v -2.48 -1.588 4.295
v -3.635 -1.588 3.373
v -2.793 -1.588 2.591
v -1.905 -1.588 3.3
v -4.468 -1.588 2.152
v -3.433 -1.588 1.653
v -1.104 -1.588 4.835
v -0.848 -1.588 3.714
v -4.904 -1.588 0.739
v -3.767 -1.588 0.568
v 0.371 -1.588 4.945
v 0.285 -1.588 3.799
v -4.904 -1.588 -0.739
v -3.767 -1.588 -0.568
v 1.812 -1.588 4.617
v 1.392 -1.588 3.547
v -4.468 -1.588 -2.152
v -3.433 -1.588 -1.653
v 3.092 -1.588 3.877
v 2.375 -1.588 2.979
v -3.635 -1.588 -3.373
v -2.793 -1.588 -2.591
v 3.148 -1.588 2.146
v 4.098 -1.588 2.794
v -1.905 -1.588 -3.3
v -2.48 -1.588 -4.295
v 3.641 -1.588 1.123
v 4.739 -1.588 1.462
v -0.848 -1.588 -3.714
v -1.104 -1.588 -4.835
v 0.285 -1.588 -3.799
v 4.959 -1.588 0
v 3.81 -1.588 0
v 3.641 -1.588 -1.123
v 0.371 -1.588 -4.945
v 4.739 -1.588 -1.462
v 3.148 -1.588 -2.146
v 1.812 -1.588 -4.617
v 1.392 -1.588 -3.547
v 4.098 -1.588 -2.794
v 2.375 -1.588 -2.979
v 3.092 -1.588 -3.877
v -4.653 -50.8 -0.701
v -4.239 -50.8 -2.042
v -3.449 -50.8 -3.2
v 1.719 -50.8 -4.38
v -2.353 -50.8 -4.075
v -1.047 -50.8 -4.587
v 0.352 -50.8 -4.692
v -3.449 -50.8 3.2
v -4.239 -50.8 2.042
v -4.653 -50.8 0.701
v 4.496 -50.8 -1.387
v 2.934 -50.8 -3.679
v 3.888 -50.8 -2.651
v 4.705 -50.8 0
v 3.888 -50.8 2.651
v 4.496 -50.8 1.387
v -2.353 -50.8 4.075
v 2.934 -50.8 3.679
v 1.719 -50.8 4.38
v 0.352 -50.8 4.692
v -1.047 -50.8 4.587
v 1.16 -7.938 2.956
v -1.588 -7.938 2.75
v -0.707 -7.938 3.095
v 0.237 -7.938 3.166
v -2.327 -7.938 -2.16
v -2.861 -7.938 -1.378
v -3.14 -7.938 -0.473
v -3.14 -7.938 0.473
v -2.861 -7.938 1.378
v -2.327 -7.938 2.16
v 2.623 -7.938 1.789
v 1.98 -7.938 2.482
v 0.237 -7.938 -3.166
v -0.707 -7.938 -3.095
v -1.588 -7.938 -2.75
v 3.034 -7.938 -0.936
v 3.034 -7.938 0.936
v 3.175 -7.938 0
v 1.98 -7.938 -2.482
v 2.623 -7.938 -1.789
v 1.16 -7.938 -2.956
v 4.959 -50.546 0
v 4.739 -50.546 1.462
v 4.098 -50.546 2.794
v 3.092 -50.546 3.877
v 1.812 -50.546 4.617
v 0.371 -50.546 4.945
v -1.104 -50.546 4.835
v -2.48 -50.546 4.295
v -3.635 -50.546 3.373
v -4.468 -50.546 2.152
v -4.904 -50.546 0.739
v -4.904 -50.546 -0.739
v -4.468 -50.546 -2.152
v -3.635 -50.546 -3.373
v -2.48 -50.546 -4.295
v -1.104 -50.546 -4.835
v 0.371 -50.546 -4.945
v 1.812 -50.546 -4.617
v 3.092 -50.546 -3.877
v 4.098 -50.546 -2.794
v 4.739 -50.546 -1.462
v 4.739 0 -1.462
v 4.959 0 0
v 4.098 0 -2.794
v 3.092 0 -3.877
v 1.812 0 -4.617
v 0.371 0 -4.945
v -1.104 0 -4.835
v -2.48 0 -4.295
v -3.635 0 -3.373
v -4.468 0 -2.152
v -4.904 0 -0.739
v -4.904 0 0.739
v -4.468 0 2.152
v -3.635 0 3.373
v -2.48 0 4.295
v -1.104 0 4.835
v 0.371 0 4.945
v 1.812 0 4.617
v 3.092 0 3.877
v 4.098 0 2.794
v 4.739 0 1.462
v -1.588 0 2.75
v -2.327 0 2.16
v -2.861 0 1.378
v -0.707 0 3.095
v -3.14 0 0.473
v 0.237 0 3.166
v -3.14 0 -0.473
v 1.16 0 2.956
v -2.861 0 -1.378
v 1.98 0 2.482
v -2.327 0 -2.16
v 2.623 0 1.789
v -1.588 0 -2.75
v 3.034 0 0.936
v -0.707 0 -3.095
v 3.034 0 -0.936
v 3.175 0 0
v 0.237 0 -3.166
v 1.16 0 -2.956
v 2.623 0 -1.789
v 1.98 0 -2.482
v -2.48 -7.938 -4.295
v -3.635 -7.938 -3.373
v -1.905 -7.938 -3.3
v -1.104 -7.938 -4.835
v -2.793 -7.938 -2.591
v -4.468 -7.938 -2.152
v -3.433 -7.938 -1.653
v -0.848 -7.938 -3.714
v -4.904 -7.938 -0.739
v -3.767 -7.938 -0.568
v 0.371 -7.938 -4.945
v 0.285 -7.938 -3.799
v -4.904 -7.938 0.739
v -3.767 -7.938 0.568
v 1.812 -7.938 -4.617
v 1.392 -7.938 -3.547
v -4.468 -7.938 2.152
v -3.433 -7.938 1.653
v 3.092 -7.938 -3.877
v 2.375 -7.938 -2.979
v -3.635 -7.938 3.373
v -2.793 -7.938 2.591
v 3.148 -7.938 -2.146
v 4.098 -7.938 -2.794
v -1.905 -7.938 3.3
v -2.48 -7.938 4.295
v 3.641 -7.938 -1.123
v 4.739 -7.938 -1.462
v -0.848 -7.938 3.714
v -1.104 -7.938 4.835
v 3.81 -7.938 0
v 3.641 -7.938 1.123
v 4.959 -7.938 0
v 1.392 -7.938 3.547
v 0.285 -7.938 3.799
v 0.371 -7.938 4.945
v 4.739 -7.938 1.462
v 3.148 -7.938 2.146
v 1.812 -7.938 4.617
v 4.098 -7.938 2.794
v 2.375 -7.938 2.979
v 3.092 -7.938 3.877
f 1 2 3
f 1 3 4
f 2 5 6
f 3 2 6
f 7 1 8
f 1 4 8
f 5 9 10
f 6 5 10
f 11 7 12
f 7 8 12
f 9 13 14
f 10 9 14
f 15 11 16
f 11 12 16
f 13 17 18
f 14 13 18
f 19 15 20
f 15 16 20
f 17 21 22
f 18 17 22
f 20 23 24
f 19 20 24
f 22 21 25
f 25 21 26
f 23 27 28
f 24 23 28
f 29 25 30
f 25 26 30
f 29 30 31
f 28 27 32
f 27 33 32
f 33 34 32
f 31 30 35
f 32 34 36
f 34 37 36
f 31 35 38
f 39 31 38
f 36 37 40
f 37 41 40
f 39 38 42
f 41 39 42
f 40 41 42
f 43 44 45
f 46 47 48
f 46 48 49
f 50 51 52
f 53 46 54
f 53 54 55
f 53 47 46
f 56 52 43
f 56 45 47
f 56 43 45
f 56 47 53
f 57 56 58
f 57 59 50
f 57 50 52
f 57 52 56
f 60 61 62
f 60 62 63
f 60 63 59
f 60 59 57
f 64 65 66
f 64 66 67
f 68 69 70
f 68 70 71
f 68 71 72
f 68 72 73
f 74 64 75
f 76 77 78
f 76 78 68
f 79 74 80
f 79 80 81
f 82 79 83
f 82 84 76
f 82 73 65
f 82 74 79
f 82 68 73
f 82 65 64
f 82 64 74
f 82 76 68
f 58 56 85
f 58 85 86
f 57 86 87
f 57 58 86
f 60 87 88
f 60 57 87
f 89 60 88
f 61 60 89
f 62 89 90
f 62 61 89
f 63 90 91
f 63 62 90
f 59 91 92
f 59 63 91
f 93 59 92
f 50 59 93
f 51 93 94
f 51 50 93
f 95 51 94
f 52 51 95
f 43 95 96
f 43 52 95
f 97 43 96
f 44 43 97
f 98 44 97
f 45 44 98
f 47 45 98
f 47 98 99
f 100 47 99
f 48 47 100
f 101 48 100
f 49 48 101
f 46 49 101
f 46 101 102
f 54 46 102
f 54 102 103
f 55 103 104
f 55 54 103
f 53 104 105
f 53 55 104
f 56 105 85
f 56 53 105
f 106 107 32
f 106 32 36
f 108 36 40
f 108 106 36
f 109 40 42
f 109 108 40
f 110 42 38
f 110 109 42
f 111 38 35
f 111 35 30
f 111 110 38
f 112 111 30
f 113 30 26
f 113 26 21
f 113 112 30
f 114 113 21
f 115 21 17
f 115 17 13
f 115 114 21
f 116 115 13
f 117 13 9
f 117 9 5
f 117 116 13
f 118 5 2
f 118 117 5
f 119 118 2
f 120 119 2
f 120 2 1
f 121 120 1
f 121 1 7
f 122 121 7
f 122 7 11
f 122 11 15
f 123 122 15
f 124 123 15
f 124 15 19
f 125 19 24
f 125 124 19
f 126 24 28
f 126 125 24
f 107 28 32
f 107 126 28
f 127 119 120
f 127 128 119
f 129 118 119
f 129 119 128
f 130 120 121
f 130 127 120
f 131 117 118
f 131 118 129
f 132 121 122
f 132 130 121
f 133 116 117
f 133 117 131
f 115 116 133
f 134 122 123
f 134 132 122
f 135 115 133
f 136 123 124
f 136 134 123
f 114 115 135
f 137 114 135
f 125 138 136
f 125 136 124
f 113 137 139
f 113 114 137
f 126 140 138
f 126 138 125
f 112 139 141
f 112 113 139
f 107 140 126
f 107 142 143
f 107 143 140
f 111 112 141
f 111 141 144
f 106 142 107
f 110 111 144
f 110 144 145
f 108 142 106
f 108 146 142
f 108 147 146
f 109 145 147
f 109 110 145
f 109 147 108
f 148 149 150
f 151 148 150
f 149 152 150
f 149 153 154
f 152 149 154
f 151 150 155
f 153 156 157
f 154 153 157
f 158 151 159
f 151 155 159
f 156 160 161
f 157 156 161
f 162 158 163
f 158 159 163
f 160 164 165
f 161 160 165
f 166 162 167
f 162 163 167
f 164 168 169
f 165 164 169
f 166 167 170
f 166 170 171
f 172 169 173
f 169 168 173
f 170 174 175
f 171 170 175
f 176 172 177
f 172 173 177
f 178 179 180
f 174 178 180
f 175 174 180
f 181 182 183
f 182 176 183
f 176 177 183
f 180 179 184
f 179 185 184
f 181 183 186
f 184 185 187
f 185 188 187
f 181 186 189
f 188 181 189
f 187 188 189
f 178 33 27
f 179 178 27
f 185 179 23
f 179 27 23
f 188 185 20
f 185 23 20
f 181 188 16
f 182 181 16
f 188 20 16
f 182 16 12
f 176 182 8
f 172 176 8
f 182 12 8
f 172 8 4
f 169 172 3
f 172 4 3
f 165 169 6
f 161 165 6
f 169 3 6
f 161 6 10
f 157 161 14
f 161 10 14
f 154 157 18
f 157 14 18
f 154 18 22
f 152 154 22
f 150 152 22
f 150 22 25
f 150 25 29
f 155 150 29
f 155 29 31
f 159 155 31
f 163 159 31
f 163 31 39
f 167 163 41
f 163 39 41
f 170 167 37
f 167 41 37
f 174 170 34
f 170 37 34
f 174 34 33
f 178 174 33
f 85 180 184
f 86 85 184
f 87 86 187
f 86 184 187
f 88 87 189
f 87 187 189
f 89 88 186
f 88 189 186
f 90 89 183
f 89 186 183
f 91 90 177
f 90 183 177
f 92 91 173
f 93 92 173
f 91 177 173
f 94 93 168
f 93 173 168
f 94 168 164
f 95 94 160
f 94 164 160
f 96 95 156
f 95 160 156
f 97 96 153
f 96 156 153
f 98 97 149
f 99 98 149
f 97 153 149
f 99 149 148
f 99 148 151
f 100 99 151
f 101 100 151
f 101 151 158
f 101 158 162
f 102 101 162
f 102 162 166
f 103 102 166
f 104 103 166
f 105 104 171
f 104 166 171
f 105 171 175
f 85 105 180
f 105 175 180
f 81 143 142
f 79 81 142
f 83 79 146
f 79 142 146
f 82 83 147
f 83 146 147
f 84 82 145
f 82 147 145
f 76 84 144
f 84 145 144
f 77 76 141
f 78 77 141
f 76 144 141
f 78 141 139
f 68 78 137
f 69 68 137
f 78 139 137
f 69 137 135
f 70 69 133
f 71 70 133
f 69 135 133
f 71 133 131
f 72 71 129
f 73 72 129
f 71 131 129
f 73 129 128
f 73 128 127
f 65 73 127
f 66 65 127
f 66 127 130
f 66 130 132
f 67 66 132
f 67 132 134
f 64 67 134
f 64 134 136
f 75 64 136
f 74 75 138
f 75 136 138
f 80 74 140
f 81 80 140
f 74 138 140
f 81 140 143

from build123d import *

# Parameters (mm, degrees)
SKETCH1_R           = 4.95935
BOSS_EXTRUDE1_DEPTH = 1.5875
SKETCH2_R           = 3.81
BOSS_EXTRUDE2_DEPTH = 6.35
SKETCH3_R           = 4.95935
BOSS_EXTRUDE4_DEPTH = 42.8625
CHAMFER1_SIZE       = 0.254
SKETCH4_R           = 3.175
CUT_EXTRUDE1_DEPTH  = 7.9375


with BuildPart() as part:
    # Sketch1 → Boss-Extrude1 (new body)
    with BuildSketch(Plane(origin=(0, 0, 0), x_dir=(1, 0, 0), z_dir=(0, 1, 0))):
        Circle(SKETCH1_R)
    extrude(amount=-BOSS_EXTRUDE1_DEPTH)

    # Sketch2 → Boss-Extrude2 (add)
    with BuildSketch(Plane.XZ.offset(1.5875)):
        Circle(SKETCH2_R)
    extrude(amount=BOSS_EXTRUDE2_DEPTH)

    # Sketch3 → Boss-Extrude4 (add)
    with BuildSketch(Plane.XZ.offset(7.9375)):
        Circle(SKETCH3_R)
    extrude(amount=BOSS_EXTRUDE4_DEPTH)

    # Chamfer1
    chamfer1_edges = [part.edges().sort_by_distance(p)[0] for p in [
        (-4.95935, -50.8, 0),
    ]]
    chamfer(chamfer1_edges, length=CHAMFER1_SIZE)

    # Sketch4 → Cut-Extrude1 (cut)
    with BuildSketch(Plane(origin=(0, 0, 0), x_dir=(1, 0, 0), z_dir=(0, 1, 0))):
        Circle(SKETCH4_R)
    extrude(amount=-CUT_EXTRUDE1_DEPTH, mode=Mode.SUBTRACT)


solid = part.part
